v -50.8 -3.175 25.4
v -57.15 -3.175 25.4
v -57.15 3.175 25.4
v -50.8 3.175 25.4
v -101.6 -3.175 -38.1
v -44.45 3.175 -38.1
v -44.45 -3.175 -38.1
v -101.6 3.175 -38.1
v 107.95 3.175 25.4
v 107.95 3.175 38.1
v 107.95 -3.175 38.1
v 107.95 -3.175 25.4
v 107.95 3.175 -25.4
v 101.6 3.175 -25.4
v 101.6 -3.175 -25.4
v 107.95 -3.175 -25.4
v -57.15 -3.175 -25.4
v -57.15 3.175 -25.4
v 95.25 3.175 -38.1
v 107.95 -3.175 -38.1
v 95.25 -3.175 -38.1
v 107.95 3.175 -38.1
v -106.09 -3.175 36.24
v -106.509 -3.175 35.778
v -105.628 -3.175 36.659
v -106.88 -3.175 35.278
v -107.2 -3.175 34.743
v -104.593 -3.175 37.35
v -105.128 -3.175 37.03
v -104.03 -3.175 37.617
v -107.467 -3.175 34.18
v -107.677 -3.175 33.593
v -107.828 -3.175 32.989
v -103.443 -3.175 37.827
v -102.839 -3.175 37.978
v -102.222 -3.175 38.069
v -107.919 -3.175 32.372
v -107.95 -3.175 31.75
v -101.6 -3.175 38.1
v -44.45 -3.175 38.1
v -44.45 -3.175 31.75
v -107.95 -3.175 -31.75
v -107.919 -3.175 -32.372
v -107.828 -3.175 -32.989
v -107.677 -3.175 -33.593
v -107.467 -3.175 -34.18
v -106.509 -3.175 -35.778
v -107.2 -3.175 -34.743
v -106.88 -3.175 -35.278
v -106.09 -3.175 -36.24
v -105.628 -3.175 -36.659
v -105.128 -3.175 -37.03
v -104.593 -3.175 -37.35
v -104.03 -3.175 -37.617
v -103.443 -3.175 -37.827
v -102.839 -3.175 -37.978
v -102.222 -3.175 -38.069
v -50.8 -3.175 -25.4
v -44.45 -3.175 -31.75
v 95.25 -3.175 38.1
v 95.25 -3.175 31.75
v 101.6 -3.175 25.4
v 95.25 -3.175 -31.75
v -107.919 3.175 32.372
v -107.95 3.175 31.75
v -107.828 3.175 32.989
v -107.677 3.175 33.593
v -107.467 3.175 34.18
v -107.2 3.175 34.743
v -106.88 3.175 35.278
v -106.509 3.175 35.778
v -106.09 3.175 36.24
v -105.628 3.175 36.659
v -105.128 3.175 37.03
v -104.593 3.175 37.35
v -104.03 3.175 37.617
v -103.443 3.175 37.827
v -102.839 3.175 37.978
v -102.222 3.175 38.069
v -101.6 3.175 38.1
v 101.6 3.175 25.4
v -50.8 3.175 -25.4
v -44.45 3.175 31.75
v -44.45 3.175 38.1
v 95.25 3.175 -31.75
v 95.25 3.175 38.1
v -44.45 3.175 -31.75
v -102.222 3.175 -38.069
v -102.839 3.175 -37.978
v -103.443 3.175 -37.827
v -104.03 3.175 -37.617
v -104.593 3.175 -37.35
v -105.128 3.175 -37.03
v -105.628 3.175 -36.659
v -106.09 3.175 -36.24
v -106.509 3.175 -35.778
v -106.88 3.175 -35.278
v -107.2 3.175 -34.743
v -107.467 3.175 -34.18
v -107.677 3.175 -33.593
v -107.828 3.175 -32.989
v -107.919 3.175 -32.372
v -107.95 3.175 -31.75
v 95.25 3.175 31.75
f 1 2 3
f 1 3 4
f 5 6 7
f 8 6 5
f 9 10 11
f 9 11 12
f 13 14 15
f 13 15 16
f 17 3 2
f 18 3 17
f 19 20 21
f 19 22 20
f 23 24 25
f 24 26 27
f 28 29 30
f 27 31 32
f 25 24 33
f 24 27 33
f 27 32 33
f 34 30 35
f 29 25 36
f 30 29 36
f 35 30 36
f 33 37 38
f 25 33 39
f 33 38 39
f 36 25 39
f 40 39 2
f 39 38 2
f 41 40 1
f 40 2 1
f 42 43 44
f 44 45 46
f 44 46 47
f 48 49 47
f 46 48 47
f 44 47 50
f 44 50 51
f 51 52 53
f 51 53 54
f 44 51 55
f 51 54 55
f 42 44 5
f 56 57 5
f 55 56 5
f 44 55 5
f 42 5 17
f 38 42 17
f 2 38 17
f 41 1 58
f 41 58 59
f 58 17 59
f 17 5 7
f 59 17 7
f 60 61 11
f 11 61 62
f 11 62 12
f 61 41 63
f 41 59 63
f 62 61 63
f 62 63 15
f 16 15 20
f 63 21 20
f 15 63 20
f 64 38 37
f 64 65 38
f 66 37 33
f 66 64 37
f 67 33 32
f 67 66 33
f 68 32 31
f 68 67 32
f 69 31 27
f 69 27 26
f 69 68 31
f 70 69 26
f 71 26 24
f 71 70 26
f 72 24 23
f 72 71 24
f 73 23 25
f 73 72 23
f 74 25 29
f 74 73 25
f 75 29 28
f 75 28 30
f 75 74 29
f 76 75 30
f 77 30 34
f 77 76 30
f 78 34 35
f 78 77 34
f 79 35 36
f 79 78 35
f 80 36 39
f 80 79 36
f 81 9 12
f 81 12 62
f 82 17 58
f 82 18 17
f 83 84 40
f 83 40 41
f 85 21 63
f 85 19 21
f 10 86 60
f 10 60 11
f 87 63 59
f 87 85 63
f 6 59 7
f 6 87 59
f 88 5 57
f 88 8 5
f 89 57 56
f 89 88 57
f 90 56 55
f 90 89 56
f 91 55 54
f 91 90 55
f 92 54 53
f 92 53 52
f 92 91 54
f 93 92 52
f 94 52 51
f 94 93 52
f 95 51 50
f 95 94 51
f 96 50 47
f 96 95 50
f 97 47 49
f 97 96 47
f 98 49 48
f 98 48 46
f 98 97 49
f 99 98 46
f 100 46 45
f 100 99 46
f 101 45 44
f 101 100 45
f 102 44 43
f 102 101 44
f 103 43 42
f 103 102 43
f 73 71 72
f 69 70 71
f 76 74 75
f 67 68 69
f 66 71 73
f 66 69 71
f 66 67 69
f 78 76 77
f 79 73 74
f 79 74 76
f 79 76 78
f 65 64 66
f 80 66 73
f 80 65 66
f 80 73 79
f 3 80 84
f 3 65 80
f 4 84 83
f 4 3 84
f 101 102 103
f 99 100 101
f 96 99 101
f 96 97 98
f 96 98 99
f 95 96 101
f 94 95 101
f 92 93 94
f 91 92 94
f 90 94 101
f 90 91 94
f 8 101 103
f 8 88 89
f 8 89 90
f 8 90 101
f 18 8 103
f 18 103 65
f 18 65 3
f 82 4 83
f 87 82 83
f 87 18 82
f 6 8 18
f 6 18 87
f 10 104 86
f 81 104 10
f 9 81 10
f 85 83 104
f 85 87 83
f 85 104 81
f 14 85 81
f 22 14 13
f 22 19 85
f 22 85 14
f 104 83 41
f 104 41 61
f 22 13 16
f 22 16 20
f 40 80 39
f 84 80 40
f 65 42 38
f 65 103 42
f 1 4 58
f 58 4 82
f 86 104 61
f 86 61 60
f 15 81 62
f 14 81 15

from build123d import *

# Parameters (mm, degrees)
SKETCH1_W           = 6.35
SKETCH1_H           = 50.8
BOSS_EXTRUDE1_DEPTH = 3.175


with BuildPart() as part:
    # Sketch1 → Boss-Extrude1 (new, symmetric)
    with BuildSketch(Plane(origin=(0, 0, 0), x_dir=(1, 0, 0), z_dir=(0, 1, 0))):
        with BuildLine():
            Line((-101.6, -38.1), (-44.45, -38.1))
            Line((-44.45, -38.1), (-44.45, -31.75))
            Line((-44.45, -31.75), (95.25, -31.75))
            Line((95.25, -31.75), (95.25, -38.1))
            Line((95.25, -38.1), (107.95, -38.1))
            Line((107.95, -38.1), (107.95, -25.4))
            Line((107.95, -25.4), (101.6, -25.4))
            Line((101.6, -25.4), (101.6, 25.4))
            Line((101.6, 25.4), (107.95, 25.4))
            Line((107.95, 25.4), (107.95, 38.1))
            Line((107.95, 38.1), (95.25, 38.1))
            Line((95.25, 38.1), (95.25, 31.75))
            Line((95.25, 31.75), (-44.45, 31.75))
            Line((-44.45, 31.75), (-44.45, 38.1))
            Line((-44.45, 38.1), (-101.6, 38.1))
            ThreePointArc((-101.6, 38.1), (-106.090128061, 36.240128061), (-107.95, 31.75))
            Line((-107.95, 31.75), (-107.95, -31.75))
            ThreePointArc((-107.95, -31.75), (-106.090128061, -36.240128061), (-101.6, -38.1))
        make_face()
        with Locations((-53.975, 0)):
            Rectangle(SKETCH1_W, SKETCH1_H, mode=Mode.SUBTRACT)
    extrude(amount=BOSS_EXTRUDE1_DEPTH, both=True)


solid = part.part
